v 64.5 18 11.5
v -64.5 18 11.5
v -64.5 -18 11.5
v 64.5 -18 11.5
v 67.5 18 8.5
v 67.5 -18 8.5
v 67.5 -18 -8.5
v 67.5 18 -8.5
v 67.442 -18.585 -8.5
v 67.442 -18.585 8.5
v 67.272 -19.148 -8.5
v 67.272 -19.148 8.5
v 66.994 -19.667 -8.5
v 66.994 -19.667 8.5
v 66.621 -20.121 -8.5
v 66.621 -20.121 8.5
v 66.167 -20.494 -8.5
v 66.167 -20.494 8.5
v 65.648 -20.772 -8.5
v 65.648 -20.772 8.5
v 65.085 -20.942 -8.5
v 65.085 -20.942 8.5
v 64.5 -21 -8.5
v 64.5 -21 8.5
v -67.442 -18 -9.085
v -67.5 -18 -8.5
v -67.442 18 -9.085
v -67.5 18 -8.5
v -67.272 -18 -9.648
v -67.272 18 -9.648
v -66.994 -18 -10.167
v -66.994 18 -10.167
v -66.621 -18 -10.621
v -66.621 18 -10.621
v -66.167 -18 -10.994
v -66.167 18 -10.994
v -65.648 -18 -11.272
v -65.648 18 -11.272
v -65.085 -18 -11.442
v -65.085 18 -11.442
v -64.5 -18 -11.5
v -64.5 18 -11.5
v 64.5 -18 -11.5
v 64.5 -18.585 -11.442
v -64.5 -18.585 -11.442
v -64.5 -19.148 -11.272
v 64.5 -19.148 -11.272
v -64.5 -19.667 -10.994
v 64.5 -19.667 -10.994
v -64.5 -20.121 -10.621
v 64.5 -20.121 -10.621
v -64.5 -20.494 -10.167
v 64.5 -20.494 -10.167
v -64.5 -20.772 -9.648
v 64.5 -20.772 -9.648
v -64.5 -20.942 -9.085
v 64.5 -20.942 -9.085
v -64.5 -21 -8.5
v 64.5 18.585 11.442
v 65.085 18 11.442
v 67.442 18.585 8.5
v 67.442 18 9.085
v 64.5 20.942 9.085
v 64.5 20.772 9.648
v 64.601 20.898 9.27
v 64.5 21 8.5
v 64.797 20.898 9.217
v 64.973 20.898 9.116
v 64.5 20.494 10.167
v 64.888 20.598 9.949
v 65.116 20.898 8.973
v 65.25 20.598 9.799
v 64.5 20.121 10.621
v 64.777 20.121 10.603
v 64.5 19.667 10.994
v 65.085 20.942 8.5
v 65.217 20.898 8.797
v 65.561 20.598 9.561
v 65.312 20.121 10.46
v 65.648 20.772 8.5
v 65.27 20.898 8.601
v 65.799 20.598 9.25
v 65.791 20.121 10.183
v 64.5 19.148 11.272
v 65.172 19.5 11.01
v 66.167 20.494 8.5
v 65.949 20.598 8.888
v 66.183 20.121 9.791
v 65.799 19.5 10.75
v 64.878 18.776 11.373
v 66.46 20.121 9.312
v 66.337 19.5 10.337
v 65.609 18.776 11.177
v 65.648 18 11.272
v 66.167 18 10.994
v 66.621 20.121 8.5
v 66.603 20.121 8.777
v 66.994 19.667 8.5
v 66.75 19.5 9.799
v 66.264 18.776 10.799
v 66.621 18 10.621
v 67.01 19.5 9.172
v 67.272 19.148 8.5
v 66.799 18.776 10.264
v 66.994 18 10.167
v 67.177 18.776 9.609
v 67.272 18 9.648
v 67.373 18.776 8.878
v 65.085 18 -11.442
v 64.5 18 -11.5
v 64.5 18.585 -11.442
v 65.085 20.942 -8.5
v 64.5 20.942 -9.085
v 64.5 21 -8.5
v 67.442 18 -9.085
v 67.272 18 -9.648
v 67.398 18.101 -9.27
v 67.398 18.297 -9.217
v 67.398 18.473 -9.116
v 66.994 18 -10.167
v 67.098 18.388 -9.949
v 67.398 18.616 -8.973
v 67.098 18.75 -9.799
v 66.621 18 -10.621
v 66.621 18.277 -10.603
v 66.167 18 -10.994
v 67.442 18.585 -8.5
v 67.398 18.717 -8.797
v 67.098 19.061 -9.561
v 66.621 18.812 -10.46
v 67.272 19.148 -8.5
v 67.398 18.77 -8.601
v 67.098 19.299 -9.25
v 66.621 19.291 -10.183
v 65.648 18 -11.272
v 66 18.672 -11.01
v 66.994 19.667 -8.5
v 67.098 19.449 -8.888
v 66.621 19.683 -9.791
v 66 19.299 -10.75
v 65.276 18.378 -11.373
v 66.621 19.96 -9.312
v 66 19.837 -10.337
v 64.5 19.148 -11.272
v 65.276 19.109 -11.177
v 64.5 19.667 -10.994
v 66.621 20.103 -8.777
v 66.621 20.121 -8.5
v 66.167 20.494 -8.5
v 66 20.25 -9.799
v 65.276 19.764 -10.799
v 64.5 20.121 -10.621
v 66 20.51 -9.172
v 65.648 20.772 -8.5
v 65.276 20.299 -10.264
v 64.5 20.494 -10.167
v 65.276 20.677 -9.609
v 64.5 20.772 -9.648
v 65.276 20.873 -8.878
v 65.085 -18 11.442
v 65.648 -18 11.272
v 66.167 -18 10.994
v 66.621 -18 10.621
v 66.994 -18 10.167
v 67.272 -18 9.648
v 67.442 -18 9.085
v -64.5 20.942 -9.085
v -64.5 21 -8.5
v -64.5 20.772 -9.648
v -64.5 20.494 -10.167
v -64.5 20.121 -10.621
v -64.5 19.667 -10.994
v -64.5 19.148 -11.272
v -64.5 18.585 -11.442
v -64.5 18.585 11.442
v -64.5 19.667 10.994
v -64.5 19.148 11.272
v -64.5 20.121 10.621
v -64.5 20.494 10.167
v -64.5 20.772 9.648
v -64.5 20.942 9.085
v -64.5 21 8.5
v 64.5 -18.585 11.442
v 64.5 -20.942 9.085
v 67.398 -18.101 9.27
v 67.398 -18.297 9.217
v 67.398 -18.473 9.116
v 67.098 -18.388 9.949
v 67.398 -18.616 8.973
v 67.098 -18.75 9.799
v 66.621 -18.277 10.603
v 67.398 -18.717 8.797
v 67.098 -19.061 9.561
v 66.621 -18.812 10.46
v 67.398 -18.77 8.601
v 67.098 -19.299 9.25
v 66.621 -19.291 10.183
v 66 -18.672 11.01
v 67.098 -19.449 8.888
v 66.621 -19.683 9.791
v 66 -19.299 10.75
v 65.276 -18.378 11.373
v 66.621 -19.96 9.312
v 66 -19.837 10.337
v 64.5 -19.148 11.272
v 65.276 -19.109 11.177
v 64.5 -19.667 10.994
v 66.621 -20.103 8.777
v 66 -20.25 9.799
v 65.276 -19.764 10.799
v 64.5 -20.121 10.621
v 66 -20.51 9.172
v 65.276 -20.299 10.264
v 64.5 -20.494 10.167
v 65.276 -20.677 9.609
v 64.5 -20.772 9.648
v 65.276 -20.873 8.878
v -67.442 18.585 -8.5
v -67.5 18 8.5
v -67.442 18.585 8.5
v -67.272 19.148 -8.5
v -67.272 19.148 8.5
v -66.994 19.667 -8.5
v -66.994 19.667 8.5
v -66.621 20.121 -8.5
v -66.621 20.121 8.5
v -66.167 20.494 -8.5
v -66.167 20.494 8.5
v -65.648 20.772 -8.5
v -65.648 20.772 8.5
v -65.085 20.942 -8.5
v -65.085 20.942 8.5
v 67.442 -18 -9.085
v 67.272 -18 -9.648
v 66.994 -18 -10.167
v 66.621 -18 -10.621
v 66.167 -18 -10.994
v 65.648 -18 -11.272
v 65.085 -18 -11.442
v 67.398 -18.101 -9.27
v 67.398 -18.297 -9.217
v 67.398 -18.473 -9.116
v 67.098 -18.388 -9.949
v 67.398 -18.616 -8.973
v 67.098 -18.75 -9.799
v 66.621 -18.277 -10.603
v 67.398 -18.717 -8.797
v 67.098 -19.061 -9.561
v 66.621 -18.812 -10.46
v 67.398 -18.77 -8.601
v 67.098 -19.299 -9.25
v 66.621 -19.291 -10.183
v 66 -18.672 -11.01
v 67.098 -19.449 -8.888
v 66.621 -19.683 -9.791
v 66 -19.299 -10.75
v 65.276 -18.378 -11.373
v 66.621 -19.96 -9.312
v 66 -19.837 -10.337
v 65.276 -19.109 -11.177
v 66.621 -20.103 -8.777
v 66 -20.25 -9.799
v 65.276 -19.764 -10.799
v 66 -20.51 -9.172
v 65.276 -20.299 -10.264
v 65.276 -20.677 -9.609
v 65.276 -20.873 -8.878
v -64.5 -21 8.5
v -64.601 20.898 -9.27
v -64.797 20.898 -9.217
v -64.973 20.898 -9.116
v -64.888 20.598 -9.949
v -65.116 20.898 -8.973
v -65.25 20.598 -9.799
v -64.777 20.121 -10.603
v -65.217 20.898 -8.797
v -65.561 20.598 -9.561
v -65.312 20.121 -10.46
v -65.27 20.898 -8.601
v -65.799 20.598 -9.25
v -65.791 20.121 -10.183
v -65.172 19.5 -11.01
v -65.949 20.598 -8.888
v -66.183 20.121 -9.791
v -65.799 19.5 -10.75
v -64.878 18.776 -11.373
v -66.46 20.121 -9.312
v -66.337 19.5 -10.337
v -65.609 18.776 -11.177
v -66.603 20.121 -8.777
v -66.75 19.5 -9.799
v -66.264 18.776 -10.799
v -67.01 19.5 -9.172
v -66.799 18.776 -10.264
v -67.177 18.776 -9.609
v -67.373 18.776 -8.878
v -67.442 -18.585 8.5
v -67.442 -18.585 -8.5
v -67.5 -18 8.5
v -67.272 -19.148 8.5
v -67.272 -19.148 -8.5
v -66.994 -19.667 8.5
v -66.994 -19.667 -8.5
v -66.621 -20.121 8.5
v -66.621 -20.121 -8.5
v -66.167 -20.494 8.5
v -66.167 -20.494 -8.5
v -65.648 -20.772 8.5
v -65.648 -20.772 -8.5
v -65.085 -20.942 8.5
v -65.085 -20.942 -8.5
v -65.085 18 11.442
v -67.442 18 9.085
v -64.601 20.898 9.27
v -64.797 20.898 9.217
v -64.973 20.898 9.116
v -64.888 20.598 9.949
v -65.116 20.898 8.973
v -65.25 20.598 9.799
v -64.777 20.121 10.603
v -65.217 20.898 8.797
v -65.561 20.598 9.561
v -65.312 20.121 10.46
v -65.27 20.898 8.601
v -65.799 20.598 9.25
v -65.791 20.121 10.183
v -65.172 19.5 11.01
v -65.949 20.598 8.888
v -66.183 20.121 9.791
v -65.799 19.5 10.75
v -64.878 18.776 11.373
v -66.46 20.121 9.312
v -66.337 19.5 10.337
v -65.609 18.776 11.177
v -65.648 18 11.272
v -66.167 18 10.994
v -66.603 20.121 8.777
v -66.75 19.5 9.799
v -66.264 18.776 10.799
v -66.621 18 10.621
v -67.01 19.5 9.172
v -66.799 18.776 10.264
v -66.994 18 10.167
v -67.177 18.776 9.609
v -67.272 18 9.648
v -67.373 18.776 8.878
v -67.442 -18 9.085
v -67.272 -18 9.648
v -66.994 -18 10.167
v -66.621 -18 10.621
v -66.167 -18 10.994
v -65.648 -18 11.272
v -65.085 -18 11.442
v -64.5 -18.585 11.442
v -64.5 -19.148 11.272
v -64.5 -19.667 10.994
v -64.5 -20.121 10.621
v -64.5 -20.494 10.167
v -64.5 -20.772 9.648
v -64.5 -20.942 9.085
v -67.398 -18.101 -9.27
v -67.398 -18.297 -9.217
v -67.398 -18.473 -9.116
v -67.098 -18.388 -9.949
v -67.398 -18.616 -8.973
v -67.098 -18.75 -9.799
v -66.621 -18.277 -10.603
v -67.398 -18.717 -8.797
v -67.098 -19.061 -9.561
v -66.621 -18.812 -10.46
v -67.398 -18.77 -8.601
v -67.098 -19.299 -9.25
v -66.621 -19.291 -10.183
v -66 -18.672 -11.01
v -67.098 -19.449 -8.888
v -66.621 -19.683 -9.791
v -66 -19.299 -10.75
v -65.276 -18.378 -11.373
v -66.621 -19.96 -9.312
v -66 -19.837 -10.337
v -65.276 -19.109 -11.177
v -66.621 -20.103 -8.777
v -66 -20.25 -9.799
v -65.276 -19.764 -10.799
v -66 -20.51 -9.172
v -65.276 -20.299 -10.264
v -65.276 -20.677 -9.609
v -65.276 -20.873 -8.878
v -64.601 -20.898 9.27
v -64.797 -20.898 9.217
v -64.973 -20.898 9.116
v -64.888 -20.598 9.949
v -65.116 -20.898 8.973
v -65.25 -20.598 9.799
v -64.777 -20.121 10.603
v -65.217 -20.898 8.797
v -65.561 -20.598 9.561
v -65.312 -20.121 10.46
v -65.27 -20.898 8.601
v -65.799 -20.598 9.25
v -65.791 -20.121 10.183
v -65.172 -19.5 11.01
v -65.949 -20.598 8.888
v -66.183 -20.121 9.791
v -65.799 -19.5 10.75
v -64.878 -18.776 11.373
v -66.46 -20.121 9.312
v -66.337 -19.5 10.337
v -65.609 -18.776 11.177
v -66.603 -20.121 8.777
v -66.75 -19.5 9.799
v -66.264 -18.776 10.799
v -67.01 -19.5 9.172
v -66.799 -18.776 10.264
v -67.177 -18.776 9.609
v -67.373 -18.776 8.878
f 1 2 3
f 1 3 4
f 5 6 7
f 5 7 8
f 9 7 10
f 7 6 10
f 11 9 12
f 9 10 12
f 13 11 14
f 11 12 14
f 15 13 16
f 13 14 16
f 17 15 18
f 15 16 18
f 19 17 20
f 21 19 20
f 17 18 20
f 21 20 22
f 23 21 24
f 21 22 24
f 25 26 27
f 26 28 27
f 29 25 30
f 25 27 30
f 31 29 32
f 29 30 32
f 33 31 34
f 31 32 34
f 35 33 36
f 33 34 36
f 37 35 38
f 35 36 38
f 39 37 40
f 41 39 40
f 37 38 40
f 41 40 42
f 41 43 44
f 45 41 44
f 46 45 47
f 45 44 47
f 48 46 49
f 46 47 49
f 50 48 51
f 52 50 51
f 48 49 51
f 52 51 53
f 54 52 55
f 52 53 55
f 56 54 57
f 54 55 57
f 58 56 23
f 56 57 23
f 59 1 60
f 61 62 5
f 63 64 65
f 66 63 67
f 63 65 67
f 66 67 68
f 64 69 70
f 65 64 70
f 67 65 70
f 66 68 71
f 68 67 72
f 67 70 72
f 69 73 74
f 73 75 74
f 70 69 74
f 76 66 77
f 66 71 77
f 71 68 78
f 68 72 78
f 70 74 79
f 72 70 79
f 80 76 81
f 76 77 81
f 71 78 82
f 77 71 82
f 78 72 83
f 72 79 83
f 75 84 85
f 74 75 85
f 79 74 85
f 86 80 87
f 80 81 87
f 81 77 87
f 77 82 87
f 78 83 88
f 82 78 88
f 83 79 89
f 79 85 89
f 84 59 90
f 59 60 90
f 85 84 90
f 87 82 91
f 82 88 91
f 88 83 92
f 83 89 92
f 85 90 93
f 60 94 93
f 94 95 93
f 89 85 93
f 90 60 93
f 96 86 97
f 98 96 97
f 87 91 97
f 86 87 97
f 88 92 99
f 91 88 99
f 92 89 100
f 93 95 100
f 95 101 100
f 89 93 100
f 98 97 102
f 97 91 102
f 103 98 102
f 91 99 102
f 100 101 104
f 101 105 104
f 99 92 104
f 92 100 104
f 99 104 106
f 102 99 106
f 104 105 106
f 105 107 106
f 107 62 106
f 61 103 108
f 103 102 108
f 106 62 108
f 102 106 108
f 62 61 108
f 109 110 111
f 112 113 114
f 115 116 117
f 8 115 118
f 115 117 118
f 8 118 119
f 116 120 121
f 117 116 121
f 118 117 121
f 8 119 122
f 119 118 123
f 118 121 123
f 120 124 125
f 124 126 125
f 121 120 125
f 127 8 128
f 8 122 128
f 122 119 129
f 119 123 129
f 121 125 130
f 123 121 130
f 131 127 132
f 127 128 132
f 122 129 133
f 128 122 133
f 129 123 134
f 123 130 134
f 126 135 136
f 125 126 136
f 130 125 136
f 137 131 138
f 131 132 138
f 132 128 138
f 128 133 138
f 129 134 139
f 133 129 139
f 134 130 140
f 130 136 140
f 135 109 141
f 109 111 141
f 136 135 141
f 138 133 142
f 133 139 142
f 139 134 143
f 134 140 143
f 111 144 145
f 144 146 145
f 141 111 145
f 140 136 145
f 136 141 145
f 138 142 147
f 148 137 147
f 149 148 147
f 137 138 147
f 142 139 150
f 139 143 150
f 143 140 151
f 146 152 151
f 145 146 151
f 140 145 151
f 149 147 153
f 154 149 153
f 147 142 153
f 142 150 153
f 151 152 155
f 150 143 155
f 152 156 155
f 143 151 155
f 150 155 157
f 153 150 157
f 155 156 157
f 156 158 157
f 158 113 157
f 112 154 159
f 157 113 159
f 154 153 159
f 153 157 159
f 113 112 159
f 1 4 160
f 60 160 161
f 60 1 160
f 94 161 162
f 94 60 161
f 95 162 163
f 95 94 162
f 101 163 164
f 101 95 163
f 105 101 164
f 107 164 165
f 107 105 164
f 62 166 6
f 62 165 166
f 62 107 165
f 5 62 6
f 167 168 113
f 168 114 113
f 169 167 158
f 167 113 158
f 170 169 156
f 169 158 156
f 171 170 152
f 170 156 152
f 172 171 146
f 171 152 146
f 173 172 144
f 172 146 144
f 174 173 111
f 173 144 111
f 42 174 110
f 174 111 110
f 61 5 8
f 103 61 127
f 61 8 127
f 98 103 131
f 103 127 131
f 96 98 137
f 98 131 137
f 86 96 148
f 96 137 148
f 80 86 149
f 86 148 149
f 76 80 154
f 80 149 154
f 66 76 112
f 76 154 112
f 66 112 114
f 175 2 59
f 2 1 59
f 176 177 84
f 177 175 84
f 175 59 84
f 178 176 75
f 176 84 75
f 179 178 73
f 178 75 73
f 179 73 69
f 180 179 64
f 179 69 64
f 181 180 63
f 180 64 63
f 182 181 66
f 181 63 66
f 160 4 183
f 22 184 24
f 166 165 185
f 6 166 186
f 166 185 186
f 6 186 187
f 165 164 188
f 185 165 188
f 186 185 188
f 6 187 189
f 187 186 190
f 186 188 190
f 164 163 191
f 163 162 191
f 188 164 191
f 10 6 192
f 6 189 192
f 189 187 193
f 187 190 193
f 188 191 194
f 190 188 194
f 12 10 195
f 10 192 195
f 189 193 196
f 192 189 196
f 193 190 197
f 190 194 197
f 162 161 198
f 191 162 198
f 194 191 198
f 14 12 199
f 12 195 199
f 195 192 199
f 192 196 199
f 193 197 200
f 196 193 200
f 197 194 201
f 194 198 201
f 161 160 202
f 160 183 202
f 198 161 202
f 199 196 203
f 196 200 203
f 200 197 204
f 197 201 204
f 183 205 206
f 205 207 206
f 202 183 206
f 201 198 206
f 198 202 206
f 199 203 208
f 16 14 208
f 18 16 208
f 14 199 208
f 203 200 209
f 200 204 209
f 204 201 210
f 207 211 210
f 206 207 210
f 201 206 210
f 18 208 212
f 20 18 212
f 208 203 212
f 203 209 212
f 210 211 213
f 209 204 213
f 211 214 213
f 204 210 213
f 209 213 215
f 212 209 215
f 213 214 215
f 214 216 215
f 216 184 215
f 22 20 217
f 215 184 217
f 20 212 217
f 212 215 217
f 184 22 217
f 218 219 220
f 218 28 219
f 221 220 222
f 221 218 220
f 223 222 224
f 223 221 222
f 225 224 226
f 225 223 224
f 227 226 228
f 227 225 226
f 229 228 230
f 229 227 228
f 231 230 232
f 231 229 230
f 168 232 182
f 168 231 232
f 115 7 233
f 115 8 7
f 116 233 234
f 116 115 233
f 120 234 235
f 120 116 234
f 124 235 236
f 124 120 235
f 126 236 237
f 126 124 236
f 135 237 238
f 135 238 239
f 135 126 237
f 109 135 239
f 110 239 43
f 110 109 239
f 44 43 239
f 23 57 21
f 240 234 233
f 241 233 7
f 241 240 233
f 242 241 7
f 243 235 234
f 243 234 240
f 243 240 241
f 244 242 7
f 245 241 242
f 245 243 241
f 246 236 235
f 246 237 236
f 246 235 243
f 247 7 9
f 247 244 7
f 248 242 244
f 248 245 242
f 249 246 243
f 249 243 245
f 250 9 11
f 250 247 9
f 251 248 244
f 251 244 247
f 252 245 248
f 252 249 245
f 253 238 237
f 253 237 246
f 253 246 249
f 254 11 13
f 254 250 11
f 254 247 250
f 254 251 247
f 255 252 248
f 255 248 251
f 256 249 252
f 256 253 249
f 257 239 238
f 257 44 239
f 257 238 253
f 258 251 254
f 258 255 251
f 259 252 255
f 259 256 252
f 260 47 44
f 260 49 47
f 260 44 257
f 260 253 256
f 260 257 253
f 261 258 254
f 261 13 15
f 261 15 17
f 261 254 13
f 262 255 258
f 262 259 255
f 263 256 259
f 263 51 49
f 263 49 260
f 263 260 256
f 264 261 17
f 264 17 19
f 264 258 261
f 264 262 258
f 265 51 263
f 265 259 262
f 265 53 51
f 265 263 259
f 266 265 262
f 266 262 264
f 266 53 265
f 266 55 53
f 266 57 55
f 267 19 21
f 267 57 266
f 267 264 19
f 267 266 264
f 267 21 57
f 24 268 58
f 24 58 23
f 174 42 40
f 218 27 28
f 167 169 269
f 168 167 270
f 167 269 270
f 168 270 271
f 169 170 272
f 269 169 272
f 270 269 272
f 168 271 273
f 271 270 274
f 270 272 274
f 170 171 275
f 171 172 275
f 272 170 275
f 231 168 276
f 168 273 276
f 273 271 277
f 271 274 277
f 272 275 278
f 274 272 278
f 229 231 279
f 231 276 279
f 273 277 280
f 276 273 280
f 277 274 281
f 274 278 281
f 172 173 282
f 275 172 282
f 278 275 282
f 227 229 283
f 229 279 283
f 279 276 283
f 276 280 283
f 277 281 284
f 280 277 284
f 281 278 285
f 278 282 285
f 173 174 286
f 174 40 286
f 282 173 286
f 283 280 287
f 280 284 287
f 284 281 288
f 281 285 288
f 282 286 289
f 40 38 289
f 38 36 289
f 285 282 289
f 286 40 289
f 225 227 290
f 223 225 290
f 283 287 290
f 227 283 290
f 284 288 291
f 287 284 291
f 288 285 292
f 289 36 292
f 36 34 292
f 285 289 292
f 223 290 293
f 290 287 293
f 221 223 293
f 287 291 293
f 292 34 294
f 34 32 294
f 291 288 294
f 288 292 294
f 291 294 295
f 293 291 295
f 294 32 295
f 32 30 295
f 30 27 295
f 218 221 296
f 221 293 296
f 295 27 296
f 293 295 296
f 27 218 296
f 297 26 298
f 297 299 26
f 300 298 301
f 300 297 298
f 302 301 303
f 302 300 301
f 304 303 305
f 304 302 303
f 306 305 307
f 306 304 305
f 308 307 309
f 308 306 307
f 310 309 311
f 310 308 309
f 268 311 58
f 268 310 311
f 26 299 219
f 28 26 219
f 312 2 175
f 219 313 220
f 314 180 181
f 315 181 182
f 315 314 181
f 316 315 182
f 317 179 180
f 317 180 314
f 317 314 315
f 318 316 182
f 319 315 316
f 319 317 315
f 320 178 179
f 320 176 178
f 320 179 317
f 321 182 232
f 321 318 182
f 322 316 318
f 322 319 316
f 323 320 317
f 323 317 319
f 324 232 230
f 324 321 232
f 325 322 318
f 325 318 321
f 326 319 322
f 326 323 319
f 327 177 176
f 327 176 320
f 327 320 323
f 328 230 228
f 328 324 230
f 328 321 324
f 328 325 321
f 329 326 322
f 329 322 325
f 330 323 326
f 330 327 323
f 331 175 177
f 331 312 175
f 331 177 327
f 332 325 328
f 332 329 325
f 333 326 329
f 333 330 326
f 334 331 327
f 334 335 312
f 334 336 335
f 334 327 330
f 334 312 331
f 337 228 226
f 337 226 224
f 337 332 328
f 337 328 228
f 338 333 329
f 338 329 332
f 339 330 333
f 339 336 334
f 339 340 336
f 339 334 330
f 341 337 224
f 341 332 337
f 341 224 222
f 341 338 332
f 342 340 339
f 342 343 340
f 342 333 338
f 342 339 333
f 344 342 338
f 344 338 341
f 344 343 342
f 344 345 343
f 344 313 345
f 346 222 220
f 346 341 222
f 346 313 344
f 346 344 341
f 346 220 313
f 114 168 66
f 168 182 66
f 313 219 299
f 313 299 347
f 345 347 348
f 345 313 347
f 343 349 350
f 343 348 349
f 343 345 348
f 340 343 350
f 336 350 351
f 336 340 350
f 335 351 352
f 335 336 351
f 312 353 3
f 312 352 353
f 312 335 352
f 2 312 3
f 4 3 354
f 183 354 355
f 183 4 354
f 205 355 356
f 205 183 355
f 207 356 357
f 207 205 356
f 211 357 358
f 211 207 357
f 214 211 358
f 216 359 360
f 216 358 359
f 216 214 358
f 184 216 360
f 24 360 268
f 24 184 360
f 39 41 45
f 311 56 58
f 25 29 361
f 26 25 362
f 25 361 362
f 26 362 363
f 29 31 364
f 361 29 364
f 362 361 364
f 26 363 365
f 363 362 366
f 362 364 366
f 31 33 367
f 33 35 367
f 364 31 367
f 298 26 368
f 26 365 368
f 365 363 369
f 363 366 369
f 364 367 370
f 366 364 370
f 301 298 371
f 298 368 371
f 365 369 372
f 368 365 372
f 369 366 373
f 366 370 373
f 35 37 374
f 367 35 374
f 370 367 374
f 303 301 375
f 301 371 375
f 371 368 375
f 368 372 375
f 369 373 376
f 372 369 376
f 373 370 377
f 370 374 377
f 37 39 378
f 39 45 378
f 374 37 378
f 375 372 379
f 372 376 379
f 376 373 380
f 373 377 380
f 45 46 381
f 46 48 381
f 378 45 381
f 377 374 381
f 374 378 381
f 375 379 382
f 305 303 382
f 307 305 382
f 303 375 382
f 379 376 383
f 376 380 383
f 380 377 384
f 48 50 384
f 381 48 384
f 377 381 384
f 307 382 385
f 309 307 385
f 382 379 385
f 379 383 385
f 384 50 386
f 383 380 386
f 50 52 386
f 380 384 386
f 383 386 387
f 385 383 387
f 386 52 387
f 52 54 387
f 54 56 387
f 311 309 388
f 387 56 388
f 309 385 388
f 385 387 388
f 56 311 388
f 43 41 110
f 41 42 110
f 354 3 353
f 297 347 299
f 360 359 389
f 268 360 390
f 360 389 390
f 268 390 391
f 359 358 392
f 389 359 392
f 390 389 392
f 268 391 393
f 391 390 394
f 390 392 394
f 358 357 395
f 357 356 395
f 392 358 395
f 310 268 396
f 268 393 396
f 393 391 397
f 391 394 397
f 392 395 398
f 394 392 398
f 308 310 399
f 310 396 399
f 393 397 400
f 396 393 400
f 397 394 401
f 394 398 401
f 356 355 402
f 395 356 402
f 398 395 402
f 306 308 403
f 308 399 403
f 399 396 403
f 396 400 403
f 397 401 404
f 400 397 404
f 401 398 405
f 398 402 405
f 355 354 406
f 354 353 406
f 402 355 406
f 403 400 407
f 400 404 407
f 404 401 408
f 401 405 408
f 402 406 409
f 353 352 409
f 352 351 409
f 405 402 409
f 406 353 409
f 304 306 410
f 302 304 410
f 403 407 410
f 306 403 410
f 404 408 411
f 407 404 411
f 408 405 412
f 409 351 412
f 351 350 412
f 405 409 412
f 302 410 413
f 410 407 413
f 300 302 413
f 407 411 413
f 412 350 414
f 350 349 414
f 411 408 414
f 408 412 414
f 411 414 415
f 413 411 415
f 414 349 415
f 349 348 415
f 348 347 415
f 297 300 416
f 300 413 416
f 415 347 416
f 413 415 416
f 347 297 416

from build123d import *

# Parameters (mm, degrees)
ESBO_O1_W                = 135
ESBO_O1_H                = 42
RESSALTO_EXTRUS_O1_DEPTH = 11.5
FILETE1_R                = 3


with BuildPart() as part:
    # Esboço1 → Ressalto-extrusão1 (new body, symmetric)
    with BuildSketch(Plane.XY):
        Rectangle(ESBO_O1_W, ESBO_O1_H)
    extrude(amount=RESSALTO_EXTRUS_O1_DEPTH, both=True)

    # Filete1
    filete1_edges = [part.edges().sort_by_distance(p)[0] for p in [
        (-67.5, 0, 11.5),
        (0, -21, 11.5),
        (67.5, 0, 11.5),
        (0, -21, -11.5),
        (-67.5, 0, -11.5),
        (0, 21, -11.5),
        (67.5, 0, -11.5),
        (0, 21, 11.5),
        (67.5, -21, 0),
        (-67.5, -21, 0),
        (-67.5, 21, 0),
        (67.5, 21, 0),
    ]]
    fillet(filete1_edges, radius=FILETE1_R)


solid = part.part
